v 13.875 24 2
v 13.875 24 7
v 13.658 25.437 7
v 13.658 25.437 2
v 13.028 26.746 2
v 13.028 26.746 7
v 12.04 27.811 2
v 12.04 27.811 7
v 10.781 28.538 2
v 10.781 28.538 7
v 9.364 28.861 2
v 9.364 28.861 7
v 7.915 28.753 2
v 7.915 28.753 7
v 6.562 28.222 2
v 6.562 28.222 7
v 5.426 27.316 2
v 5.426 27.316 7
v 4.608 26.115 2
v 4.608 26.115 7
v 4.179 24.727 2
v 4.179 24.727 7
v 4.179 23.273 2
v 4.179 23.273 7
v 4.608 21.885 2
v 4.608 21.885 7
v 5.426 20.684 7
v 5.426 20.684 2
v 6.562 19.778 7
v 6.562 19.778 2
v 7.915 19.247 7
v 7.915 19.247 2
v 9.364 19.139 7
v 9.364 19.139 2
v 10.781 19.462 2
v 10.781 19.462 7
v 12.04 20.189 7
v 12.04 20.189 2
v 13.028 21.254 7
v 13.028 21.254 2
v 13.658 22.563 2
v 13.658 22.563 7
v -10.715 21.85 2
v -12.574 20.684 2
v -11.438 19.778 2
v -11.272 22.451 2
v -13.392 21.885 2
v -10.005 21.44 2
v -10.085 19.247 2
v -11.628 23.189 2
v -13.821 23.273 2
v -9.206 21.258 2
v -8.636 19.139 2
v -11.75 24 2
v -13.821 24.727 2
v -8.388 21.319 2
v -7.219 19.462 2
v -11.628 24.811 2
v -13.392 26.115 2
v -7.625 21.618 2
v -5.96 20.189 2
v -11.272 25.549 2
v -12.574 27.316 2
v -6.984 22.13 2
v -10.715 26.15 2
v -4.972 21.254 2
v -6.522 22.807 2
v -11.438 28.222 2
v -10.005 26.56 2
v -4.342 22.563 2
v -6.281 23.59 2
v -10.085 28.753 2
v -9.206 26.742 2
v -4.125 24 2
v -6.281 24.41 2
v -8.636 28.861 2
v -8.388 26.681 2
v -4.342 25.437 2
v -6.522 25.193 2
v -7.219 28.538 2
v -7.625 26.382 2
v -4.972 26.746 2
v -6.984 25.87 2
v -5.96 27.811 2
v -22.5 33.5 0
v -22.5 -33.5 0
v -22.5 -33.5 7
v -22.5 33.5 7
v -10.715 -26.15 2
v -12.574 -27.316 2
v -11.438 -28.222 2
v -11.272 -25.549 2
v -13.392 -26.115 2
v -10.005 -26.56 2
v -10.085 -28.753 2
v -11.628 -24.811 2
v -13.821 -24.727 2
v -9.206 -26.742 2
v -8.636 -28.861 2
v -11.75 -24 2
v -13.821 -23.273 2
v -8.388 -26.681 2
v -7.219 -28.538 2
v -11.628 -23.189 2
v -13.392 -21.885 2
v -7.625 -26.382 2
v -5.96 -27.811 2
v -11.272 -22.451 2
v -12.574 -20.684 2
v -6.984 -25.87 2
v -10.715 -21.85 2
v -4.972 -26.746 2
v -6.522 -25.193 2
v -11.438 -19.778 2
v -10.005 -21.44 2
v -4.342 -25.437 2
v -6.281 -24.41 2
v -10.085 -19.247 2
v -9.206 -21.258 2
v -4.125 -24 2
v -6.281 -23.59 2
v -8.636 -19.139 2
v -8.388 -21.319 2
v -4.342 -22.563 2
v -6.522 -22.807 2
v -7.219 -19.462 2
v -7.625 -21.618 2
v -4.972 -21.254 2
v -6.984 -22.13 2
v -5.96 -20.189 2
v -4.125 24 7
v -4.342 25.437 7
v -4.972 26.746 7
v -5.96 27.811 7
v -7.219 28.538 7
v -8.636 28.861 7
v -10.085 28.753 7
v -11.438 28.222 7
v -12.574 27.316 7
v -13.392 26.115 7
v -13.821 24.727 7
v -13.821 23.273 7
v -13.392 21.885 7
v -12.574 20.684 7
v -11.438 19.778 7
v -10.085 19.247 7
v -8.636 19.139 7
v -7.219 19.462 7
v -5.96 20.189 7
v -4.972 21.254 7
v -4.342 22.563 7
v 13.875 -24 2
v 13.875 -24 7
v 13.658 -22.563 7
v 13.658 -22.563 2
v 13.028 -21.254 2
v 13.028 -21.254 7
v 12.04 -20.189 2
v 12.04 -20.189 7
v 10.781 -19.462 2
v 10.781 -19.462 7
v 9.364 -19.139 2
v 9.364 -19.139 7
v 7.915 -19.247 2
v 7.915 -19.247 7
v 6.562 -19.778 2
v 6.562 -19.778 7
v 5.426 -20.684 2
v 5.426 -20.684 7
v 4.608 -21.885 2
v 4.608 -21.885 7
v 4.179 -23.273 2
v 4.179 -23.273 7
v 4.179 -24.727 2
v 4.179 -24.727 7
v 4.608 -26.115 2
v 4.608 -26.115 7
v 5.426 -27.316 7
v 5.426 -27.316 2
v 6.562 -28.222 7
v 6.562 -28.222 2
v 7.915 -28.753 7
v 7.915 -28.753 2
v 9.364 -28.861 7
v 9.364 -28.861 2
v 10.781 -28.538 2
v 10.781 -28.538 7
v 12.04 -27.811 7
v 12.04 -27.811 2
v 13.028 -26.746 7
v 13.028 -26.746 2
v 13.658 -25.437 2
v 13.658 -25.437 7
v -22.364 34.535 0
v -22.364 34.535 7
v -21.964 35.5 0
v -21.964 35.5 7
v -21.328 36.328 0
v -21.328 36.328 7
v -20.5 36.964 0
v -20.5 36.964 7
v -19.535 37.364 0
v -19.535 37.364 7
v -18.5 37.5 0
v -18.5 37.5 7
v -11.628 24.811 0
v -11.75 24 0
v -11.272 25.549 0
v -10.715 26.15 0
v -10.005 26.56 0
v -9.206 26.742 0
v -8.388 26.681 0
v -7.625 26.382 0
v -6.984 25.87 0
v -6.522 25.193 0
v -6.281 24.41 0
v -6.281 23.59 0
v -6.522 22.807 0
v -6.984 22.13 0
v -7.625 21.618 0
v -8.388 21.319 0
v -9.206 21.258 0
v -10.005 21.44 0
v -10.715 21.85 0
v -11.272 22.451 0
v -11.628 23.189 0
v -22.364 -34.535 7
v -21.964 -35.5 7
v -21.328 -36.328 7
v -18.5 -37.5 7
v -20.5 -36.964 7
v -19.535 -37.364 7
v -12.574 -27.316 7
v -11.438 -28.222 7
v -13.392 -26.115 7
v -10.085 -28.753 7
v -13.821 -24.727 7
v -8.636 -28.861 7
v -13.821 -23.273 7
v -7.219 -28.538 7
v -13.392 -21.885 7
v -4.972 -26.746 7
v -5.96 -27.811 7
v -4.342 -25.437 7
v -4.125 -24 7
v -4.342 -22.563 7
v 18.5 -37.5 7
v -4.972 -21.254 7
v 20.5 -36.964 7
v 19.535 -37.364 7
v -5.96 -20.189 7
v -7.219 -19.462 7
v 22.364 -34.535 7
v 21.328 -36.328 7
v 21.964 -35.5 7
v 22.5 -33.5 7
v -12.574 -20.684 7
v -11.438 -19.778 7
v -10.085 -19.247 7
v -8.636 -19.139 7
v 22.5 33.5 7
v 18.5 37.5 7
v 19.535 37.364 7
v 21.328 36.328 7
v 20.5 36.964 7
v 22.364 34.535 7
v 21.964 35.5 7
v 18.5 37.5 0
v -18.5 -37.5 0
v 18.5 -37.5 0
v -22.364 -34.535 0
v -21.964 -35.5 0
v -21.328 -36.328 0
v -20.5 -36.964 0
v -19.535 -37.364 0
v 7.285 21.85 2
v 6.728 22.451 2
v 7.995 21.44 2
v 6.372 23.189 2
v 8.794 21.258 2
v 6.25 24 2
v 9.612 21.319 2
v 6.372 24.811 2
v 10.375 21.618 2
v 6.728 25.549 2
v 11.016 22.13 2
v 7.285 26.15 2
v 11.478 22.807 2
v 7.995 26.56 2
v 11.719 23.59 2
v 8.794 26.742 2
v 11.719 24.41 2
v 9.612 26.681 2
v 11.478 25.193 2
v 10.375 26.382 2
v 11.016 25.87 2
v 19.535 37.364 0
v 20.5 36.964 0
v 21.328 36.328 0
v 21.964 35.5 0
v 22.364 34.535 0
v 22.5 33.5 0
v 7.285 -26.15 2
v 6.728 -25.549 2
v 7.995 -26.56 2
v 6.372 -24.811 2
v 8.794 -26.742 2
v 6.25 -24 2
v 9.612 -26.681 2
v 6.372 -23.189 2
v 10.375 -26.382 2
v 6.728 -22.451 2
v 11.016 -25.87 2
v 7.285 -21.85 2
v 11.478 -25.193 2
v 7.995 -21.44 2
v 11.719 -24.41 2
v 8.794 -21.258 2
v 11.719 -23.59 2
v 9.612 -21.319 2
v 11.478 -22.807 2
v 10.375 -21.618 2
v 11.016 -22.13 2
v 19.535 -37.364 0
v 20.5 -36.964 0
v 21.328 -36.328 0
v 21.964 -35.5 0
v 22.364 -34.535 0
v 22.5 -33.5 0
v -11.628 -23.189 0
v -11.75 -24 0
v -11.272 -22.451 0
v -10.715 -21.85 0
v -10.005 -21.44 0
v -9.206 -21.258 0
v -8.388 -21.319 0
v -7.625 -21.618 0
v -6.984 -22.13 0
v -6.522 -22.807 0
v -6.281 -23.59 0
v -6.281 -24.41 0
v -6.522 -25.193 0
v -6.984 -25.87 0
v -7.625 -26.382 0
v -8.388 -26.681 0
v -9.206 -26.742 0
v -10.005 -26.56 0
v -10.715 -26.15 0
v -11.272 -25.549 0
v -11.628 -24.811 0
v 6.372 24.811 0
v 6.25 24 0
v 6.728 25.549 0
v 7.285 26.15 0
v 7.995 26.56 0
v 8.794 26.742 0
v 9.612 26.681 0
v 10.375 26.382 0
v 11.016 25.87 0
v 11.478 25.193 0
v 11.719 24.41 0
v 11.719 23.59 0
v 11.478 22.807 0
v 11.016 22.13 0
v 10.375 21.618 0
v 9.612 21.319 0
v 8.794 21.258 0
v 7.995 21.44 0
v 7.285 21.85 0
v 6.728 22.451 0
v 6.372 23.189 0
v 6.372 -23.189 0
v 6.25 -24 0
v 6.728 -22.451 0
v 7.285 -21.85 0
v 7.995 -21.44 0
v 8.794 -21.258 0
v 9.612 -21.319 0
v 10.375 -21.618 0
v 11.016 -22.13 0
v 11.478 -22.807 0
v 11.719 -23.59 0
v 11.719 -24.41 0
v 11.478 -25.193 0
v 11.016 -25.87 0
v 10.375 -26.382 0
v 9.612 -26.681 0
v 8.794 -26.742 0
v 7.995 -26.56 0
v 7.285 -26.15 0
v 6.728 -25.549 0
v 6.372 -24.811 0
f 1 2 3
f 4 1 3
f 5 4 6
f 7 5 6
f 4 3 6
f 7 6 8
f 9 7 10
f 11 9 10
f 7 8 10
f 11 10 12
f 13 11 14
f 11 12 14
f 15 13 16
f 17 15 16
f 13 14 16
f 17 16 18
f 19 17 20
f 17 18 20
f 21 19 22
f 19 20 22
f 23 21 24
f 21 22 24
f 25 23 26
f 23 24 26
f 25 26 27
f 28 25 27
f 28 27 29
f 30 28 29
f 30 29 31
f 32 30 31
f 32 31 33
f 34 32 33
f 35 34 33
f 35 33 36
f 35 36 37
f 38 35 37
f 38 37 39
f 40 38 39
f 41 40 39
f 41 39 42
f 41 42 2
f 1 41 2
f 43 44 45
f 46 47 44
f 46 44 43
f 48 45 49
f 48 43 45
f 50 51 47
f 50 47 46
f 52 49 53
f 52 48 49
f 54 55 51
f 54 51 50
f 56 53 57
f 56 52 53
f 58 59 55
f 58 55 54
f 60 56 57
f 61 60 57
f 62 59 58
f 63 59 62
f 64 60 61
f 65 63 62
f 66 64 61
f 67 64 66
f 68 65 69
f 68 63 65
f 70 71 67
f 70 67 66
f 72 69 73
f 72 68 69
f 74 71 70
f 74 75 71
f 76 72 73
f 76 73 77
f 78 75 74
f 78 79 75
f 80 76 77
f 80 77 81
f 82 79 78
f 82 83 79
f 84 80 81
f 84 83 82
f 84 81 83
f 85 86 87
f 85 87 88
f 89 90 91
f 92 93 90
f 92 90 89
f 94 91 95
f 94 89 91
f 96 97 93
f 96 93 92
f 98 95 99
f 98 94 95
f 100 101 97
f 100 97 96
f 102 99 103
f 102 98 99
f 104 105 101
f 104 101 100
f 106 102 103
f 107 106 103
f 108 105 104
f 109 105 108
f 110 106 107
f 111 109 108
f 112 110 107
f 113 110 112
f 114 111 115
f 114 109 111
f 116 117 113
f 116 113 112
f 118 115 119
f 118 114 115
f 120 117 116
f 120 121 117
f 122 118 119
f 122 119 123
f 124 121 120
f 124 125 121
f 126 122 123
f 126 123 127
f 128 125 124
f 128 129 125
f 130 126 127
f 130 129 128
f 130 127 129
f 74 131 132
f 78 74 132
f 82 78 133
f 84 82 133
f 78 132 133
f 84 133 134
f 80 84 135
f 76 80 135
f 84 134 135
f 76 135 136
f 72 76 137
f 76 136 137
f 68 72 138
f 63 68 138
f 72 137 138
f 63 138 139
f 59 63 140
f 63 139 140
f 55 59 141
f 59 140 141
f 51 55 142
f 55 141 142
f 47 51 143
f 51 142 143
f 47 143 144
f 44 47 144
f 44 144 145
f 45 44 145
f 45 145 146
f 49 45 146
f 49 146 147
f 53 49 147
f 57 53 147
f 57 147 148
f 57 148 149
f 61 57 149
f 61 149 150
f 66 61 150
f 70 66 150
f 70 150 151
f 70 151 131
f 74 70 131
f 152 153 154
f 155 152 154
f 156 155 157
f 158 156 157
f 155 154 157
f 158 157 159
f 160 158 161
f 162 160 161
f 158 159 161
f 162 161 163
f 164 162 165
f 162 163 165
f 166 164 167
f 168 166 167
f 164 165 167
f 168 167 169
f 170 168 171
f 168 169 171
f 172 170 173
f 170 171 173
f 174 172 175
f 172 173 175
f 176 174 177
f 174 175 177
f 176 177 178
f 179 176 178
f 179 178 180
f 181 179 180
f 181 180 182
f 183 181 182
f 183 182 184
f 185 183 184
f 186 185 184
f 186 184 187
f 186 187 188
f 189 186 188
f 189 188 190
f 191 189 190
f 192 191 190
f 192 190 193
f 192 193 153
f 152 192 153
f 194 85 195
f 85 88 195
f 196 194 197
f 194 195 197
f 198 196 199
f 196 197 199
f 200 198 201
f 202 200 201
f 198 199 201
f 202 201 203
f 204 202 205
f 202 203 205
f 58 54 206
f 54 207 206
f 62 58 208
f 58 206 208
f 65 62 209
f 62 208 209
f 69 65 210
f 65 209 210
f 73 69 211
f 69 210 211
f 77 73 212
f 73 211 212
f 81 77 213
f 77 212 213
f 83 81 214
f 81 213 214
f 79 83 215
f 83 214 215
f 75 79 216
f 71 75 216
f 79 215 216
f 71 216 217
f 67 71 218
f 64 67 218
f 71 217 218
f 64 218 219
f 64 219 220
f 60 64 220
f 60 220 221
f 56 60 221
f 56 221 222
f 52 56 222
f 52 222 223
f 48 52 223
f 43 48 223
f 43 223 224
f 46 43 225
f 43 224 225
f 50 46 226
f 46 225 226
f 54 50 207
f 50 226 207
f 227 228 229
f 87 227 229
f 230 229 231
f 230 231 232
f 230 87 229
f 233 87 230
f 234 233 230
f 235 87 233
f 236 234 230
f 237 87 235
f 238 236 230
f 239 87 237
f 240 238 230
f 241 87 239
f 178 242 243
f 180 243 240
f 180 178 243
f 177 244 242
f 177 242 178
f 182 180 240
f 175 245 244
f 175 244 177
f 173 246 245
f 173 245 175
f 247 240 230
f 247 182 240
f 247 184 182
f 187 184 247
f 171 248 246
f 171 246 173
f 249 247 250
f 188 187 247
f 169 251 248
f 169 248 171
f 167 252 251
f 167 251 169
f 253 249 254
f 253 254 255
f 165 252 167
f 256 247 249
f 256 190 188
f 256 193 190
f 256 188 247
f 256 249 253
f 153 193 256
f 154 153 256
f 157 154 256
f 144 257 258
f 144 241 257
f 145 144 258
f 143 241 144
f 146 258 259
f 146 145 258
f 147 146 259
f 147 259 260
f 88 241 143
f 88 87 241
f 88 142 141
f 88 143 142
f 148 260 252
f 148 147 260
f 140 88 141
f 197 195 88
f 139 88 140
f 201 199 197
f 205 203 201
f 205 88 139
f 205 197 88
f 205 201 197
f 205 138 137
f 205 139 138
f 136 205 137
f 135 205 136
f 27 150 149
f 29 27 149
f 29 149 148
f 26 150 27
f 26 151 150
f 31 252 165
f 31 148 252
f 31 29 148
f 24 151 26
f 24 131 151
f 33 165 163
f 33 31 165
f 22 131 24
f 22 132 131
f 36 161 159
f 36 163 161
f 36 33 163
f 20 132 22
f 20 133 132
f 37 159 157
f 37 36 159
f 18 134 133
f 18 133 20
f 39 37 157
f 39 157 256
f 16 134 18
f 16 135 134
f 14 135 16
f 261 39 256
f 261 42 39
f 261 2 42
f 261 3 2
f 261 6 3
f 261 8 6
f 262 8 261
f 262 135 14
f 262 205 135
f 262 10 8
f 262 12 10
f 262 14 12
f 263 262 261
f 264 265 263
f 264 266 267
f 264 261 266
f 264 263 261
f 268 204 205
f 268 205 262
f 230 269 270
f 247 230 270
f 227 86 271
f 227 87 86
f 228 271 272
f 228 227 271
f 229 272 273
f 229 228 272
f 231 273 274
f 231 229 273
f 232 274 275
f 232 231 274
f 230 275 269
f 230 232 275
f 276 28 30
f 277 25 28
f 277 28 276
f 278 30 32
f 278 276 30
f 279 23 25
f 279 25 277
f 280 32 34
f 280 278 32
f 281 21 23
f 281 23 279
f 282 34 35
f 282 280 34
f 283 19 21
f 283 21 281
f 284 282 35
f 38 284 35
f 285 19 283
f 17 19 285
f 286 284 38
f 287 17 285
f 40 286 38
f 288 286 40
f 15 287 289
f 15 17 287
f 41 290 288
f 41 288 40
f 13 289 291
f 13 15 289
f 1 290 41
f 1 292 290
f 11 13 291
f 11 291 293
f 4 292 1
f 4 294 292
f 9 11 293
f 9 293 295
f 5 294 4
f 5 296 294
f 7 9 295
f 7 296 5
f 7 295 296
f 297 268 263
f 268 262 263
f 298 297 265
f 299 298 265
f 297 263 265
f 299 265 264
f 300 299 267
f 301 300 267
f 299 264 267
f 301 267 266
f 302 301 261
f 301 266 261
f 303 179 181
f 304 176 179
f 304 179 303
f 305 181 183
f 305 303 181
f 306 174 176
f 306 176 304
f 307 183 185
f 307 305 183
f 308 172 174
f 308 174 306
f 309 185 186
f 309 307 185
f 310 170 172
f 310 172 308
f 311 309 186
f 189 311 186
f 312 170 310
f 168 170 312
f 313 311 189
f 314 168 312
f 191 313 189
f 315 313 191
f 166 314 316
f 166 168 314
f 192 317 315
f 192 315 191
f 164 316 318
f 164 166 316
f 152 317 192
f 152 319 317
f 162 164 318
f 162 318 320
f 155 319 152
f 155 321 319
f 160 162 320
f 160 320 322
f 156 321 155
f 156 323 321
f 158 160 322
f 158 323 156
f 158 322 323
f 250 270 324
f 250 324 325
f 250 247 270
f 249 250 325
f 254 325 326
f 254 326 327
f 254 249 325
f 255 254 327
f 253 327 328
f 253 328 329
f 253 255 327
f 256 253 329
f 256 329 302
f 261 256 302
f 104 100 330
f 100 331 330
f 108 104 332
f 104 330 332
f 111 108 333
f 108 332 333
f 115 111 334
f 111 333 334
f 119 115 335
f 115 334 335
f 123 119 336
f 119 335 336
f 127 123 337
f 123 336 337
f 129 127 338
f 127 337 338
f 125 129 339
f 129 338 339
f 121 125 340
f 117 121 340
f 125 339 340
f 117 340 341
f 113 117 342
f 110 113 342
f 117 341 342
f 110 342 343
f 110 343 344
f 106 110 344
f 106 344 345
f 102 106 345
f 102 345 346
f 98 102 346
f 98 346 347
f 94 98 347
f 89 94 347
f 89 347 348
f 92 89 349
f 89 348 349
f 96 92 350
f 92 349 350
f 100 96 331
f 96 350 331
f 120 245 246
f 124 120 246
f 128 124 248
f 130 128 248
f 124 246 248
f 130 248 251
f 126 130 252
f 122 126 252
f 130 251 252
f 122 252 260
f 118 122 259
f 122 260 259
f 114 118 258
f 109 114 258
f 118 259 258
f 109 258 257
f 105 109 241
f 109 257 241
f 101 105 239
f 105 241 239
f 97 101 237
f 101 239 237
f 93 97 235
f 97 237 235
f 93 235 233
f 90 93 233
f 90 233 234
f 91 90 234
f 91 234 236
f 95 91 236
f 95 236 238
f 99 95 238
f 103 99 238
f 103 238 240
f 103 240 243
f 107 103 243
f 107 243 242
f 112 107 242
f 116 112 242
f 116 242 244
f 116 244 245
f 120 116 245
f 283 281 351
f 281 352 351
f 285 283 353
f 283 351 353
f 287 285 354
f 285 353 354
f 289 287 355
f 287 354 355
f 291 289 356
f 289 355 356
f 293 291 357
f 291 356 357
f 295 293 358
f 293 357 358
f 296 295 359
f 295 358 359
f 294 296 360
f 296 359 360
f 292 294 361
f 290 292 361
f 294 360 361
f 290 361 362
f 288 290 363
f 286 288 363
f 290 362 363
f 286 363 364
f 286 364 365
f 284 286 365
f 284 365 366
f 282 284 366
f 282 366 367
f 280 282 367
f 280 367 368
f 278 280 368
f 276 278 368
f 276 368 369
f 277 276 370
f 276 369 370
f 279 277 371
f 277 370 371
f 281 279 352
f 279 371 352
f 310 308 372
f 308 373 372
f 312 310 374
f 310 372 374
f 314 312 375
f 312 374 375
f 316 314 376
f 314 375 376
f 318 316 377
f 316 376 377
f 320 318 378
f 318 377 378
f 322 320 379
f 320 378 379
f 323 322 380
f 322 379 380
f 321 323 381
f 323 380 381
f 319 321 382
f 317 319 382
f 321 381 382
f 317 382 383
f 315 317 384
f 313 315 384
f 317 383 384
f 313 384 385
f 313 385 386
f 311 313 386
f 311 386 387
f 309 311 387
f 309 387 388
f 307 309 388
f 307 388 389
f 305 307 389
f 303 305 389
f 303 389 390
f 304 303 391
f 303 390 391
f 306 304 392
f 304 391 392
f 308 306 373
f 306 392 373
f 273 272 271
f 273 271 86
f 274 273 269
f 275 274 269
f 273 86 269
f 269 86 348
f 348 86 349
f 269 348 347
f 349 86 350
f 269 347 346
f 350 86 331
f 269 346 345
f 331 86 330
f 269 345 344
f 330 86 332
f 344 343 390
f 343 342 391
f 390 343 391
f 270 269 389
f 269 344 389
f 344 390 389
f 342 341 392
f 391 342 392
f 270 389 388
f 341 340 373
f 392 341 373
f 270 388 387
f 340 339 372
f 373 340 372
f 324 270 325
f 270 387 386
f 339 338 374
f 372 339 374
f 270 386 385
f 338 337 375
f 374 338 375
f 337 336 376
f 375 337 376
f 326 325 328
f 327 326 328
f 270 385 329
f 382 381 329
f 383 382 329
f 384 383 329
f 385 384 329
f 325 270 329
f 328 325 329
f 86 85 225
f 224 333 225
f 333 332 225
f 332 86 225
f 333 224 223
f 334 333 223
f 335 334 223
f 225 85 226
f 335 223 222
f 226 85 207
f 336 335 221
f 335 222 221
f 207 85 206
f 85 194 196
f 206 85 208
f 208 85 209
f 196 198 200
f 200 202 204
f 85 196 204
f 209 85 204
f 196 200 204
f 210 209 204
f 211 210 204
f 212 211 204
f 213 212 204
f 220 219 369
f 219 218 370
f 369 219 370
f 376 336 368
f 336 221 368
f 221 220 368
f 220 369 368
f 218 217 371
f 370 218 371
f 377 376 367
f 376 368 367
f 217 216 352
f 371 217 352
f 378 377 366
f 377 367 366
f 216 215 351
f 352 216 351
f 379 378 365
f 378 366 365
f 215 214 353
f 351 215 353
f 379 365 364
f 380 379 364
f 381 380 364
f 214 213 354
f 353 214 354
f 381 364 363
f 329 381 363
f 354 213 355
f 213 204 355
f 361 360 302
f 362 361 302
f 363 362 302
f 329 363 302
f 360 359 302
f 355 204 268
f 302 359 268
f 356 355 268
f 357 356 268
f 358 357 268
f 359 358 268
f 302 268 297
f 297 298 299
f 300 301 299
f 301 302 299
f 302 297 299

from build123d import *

# Parameters (mm, degrees)
F0_W           = 45
F0_H           = 75
F1_DEPTH       = 7
F3_D           = 5.5
F3_CBORE_D     = 9.75
F3_CBORE_DEPTH = 5
F4_R           = 4


with BuildPart() as f1:
    # F0 (on Top) → F1 (new body)
    with BuildSketch(Plane.XY):
        Rectangle(F0_W, F0_H)
    extrude(amount=F1_DEPTH)

    # F3 (through all)
    with Locations(Plane.XY.offset(7)):
        with Locations((-9, -24), (9, -24), (9, 24), (-9, 24)):
            CounterBoreHole(F3_D / 2, F3_CBORE_D / 2, F3_CBORE_DEPTH)

    # F4
    f4_edges = [f1.edges().sort_by_distance(p)[0] for p in [
        (22.5, -37.5, 3.5),
        (-22.5, -37.5, 3.5),
        (22.5, 37.5, 3.5),
        (-22.5, 37.5, 3.5),
    ]]
    fillet(f4_edges, radius=F4_R)


solid = f1.part
